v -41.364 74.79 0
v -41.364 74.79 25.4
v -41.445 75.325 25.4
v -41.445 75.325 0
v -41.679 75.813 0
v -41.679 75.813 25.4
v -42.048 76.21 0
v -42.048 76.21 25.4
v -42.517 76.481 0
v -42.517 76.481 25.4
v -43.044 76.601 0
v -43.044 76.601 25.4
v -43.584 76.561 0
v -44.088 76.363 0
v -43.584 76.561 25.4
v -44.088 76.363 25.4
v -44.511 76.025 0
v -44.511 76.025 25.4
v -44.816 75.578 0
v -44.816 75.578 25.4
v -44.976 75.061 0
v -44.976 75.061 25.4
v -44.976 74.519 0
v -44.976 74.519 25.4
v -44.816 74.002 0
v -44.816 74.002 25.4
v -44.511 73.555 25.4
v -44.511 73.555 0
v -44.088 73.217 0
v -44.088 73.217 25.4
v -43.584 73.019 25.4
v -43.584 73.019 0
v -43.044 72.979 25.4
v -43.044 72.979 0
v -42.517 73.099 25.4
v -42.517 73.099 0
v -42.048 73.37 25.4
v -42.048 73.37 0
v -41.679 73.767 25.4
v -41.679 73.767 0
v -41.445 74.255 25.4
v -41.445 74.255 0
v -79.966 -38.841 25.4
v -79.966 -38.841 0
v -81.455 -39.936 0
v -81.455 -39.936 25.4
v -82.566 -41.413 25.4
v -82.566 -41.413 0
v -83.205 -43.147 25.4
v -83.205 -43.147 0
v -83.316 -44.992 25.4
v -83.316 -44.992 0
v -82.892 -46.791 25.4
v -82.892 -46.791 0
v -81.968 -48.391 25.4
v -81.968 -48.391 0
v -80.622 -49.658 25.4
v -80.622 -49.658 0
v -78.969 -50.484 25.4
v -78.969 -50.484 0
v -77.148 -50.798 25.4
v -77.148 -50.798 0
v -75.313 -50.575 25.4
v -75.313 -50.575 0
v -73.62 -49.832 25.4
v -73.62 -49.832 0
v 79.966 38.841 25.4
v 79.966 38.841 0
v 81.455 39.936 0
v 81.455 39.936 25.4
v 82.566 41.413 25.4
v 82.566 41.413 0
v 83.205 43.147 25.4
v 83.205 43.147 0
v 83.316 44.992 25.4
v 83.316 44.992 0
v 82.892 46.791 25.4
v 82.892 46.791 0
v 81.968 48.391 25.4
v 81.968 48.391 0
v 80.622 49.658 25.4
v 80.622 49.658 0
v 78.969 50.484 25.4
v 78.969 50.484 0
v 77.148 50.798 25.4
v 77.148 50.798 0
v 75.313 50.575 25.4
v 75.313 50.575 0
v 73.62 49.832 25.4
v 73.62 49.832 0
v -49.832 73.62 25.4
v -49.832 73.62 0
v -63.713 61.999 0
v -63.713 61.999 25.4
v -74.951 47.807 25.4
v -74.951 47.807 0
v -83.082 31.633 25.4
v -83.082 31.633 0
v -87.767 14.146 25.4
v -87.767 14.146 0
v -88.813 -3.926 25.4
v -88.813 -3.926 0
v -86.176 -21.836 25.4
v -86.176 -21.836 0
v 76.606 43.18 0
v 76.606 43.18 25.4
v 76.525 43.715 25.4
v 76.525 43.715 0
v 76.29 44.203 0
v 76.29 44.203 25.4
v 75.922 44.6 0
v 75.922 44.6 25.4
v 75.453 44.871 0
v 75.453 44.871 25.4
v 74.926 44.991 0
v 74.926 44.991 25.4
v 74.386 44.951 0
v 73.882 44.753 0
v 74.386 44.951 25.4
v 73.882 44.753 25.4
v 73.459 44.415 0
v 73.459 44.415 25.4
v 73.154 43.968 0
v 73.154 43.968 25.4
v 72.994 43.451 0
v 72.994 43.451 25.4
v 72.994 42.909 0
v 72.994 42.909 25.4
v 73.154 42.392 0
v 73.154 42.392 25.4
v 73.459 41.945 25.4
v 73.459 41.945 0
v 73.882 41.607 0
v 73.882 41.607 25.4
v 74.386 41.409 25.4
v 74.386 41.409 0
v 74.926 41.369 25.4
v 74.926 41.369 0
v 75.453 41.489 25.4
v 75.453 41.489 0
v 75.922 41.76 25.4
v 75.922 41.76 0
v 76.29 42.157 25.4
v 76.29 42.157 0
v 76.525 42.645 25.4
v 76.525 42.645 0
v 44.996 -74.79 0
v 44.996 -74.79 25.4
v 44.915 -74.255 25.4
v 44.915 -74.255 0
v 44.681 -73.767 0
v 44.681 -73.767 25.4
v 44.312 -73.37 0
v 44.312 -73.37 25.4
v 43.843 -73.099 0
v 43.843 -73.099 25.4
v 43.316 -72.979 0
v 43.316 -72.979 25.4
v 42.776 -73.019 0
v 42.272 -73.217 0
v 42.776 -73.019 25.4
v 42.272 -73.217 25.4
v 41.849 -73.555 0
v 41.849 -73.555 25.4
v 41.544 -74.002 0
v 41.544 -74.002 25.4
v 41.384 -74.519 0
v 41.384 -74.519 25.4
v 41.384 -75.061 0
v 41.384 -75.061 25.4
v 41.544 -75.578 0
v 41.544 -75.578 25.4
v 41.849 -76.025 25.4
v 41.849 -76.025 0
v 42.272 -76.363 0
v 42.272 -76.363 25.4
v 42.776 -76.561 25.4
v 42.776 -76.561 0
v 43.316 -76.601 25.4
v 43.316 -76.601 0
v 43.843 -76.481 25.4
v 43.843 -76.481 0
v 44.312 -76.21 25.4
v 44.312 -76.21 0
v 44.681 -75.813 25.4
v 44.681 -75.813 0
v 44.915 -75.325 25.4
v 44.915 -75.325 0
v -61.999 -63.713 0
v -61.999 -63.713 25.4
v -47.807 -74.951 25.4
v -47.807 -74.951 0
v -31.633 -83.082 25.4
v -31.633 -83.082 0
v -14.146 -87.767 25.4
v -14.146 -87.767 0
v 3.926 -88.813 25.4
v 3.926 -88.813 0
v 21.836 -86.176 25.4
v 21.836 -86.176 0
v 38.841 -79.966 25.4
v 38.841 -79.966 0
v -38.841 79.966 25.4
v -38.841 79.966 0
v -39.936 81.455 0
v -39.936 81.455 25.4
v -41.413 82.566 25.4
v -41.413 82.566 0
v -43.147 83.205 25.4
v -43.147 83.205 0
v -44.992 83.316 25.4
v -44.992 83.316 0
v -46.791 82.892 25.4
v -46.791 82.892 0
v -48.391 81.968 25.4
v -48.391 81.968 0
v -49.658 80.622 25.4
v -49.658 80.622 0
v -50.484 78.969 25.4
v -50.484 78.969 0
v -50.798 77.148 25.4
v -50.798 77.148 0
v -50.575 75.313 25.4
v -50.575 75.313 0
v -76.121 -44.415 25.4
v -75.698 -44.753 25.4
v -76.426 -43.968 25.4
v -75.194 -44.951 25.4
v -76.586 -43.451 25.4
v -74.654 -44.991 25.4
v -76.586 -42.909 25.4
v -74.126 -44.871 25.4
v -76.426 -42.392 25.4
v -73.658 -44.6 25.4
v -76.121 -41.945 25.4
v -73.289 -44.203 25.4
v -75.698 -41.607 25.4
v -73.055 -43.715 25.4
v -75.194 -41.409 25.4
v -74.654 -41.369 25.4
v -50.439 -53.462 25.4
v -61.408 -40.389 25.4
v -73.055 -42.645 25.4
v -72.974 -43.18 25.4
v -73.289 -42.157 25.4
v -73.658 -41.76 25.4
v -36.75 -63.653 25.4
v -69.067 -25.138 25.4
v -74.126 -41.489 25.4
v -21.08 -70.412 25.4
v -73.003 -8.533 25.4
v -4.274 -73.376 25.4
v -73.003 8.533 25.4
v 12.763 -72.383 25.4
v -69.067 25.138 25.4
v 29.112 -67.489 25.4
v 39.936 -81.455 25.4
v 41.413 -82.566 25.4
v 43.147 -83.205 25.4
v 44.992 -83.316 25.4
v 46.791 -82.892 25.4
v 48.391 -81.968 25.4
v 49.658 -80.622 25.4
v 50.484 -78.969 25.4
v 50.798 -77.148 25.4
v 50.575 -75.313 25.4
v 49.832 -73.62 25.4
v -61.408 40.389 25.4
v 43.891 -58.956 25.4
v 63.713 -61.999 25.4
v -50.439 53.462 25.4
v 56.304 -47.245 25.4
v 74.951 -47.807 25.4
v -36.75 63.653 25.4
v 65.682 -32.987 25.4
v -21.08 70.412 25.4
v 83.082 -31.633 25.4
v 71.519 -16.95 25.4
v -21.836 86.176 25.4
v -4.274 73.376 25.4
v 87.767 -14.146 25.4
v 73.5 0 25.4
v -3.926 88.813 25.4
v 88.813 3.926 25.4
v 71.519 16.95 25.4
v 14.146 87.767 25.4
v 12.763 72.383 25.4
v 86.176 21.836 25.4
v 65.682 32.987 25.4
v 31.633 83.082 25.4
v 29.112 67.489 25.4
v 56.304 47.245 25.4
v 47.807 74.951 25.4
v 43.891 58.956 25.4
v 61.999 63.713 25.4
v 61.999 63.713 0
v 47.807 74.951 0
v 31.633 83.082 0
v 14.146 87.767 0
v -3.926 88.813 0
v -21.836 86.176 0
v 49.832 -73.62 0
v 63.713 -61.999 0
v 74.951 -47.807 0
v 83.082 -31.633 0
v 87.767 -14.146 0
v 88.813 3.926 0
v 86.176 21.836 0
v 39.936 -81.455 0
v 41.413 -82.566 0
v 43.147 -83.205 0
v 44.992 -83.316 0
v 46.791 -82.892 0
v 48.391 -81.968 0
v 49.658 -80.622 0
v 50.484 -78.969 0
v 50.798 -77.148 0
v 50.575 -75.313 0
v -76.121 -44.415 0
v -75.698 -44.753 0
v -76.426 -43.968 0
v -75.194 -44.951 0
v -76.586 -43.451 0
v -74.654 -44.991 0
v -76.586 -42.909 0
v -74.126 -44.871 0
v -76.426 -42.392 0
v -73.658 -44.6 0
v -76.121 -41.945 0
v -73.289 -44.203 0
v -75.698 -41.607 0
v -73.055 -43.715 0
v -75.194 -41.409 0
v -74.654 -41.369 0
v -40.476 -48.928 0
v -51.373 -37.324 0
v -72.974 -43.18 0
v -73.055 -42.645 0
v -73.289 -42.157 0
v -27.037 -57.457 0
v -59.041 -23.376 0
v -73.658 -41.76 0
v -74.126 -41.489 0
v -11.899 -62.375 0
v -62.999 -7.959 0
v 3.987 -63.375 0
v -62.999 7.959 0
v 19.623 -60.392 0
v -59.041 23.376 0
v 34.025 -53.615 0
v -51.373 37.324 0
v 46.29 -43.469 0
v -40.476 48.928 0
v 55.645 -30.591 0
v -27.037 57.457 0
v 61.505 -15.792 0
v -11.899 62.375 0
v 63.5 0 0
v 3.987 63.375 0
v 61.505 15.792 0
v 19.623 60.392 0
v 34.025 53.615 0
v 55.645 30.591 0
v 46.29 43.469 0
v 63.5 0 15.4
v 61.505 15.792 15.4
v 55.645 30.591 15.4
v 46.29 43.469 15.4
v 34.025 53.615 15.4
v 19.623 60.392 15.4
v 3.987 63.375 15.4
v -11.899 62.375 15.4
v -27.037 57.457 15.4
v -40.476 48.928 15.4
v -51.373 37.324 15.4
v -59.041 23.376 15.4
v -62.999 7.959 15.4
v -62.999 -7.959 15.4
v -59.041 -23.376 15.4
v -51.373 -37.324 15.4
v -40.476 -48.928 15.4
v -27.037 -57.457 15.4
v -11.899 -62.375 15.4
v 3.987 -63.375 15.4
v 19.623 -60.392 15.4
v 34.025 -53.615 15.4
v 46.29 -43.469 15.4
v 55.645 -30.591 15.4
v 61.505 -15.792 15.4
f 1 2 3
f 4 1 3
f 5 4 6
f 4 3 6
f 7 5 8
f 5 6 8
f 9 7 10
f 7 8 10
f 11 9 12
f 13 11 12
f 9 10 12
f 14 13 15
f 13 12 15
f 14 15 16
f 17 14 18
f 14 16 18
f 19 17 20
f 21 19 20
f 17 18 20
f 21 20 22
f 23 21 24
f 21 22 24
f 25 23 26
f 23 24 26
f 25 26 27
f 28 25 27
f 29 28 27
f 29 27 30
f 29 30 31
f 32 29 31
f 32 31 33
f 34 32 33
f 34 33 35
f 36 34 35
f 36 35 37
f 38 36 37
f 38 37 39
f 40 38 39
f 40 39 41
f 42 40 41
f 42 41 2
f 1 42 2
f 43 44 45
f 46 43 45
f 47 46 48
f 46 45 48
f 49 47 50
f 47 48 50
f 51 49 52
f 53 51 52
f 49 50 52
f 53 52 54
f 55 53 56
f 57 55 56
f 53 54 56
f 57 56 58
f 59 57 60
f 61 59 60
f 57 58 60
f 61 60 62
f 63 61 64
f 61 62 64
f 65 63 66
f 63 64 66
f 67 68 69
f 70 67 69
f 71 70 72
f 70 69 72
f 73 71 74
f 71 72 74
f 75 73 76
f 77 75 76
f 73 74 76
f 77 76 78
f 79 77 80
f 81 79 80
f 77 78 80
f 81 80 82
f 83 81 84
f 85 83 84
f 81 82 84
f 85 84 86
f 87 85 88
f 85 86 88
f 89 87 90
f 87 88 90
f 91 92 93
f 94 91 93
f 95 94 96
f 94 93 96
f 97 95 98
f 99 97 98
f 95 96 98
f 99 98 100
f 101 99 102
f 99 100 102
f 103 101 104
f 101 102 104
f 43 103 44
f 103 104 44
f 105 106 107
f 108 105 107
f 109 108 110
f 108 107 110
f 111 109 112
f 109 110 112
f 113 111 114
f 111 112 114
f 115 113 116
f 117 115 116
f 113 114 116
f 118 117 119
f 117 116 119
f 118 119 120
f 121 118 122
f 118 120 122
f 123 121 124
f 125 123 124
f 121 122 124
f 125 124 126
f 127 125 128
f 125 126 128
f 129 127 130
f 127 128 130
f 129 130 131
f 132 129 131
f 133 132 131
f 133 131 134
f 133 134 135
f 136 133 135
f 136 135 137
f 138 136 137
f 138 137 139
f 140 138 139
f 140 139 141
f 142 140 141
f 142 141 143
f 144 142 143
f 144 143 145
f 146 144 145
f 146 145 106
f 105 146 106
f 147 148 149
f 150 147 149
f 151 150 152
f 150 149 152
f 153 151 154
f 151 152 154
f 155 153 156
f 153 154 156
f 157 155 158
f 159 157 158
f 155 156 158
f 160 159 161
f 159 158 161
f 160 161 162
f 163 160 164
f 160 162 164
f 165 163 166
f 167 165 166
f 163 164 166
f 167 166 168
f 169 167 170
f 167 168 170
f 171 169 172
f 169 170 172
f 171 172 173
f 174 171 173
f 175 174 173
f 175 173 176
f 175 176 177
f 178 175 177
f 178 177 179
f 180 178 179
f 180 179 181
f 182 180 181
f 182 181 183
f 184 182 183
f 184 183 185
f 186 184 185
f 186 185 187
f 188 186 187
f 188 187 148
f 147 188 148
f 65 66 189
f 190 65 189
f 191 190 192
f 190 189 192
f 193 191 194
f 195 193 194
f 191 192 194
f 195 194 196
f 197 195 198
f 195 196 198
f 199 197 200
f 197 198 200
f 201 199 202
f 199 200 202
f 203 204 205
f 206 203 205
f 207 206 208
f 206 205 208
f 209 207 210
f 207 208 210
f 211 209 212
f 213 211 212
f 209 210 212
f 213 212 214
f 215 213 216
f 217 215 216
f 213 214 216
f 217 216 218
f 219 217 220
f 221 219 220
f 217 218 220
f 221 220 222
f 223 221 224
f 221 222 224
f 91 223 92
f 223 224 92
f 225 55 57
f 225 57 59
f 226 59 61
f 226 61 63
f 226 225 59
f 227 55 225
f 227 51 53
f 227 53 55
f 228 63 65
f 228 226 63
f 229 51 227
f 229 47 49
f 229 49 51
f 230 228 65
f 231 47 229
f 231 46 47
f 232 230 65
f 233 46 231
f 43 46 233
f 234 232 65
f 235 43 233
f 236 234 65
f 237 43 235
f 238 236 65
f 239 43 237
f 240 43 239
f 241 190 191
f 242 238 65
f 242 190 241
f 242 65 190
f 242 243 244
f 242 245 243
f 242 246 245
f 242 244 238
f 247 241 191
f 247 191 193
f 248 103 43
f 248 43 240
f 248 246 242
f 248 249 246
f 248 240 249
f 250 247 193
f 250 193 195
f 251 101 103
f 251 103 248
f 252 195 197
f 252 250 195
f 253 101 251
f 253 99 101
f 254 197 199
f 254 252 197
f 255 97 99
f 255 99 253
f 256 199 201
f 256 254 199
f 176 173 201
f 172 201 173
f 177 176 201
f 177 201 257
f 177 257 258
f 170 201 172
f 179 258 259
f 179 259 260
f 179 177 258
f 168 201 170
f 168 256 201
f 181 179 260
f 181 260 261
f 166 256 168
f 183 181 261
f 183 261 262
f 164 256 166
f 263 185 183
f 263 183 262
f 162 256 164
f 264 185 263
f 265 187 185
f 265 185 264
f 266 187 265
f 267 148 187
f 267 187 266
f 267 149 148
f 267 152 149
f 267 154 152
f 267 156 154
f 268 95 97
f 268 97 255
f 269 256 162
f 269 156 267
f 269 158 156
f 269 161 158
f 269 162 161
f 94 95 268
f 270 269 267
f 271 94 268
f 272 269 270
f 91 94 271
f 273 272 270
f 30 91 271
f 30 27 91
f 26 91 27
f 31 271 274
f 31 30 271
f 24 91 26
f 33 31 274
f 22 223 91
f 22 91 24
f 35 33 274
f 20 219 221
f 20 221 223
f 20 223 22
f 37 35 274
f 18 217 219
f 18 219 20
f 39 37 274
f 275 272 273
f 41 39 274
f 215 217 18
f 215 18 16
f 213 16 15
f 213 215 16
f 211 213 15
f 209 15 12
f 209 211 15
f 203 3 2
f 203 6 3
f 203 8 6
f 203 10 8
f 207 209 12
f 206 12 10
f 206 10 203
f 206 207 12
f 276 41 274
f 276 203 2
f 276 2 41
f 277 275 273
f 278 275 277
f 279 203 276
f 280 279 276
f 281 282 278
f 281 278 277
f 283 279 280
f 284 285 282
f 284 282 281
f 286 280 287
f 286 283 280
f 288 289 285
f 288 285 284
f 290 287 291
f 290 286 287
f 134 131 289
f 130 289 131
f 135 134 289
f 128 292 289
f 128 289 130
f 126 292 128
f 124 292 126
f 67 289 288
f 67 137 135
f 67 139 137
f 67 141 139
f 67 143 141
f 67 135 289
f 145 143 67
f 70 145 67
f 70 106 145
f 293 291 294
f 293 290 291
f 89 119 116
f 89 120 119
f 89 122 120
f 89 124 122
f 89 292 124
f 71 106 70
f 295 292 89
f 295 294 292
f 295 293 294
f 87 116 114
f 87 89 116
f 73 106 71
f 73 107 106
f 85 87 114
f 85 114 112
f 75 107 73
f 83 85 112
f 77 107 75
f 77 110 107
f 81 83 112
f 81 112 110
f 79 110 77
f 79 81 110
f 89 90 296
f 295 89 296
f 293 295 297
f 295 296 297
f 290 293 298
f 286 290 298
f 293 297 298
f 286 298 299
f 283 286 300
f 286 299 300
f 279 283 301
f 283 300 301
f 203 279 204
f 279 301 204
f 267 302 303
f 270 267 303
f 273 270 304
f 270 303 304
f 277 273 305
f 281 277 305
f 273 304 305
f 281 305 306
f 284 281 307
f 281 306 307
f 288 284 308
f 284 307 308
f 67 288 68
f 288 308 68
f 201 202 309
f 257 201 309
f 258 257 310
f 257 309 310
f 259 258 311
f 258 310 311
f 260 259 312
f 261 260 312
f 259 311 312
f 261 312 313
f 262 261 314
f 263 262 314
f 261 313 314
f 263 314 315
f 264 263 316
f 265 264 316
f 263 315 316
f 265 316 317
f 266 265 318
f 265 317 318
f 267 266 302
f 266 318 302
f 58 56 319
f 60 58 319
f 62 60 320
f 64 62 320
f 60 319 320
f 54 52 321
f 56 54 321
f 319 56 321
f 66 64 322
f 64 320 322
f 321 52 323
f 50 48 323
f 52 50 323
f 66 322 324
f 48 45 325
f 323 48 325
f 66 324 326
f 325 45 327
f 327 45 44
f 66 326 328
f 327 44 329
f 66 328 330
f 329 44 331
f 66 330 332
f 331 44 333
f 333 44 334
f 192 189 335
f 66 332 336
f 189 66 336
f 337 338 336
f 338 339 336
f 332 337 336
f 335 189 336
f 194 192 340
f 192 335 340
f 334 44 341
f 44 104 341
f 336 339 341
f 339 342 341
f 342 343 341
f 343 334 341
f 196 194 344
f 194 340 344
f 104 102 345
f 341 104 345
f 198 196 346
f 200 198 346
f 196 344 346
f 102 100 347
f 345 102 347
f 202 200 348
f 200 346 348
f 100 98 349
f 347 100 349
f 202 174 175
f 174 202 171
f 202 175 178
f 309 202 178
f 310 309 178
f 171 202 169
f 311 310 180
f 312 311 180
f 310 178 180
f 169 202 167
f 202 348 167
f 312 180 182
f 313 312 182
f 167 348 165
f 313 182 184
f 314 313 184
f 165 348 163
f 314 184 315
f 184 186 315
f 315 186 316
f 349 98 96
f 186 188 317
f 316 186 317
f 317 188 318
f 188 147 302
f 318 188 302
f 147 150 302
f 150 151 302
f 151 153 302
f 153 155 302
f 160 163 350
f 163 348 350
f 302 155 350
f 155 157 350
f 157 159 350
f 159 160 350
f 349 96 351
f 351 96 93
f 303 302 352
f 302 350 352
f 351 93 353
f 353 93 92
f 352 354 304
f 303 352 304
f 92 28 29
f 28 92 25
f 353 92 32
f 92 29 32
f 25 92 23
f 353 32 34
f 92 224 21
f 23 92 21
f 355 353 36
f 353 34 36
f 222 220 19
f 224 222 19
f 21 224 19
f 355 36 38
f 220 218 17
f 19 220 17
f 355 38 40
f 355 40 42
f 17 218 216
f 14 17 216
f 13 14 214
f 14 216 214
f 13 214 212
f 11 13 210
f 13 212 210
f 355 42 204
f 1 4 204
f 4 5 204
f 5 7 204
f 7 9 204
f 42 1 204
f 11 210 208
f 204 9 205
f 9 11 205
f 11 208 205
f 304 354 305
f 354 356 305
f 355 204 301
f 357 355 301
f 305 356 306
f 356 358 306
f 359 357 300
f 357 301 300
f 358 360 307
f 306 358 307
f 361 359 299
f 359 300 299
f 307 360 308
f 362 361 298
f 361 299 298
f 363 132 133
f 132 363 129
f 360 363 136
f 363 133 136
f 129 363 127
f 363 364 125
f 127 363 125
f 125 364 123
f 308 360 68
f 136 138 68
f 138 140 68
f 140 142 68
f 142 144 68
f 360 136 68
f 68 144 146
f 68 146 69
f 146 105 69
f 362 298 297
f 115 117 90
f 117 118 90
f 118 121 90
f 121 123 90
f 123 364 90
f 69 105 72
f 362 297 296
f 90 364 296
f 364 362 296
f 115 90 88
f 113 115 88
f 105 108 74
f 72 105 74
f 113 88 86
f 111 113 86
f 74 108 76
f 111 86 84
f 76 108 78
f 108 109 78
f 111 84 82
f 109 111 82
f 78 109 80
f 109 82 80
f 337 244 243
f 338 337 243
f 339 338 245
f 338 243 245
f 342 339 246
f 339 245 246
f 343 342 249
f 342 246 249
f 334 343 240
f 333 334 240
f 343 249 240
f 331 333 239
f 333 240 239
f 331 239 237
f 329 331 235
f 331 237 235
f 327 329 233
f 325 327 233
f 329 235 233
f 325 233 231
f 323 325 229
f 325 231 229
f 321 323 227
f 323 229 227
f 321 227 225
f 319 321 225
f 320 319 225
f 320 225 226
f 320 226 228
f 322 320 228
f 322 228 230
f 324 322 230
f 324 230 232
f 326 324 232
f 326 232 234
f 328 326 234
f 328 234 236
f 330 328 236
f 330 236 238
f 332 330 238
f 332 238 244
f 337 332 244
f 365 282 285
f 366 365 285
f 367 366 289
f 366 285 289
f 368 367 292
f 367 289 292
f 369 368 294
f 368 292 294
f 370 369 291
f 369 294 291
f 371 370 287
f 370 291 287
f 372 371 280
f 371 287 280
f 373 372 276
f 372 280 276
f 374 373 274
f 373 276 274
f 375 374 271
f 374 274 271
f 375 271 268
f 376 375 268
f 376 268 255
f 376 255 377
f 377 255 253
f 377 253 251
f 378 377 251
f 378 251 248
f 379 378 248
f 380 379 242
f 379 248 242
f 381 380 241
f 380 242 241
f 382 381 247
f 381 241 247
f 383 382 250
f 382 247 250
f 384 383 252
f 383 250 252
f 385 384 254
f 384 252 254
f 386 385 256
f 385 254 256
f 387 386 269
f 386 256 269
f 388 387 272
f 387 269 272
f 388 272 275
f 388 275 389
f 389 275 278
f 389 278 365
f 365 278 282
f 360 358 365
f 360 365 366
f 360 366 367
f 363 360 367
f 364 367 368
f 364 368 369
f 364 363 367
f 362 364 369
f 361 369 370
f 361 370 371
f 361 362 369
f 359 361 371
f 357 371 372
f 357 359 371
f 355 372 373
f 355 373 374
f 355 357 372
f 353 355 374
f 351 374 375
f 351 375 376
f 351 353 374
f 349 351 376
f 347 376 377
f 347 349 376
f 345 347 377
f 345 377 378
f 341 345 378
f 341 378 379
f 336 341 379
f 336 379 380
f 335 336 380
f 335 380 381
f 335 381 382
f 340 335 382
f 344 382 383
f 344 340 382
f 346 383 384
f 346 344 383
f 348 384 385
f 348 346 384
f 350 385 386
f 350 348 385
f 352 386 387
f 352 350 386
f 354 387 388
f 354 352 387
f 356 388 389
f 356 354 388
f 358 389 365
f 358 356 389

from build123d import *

# Parameters (mm, degrees)
SKETCH1_R           = 63.5
BOSS_EXTRUDE1_DEPTH = 25.4
CHAMFER1_SIZE       = 10
SKETCH3_R           = 1.8161
CUT_EXTRUDE1_DEPTH  = 26.4


with BuildPart() as part:
    # Sketch1 → Boss-Extrude1 (new body)
    with BuildSketch(Plane.XY):
        with BuildLine():
            ThreePointArc((49.832360156, -73.620281725), (85.870805957, -23.00901311), (79.966230688, 38.84085413))
            ThreePointArc((79.966230688, 38.84085413), (82.48891971, 47.625), (73.620281725, 49.832360156))
            ThreePointArc((73.620281725, 49.832360156), (23.00901311, 85.870805957), (-38.84085413, 79.966230688))
            ThreePointArc((-38.84085413, 79.966230688), (-47.625, 82.48891971), (-49.832360156, 73.620281725))
            ThreePointArc((-49.832360156, 73.620281725), (-85.870805957, 23.00901311), (-79.966230688, -38.84085413))
            ThreePointArc((-79.966230688, -38.84085413), (-82.48891971, -47.625), (-73.620281725, -49.832360156))
            ThreePointArc((-73.620281725, -49.832360156), (-23.00901311, -85.870805957), (38.84085413, -79.966230688))
            ThreePointArc((38.84085413, -79.966230688), (47.625, -82.48891971), (49.832360156, -73.620281725))
        make_face()
        Circle(SKETCH1_R, mode=Mode.SUBTRACT)
    extrude(amount=BOSS_EXTRUDE1_DEPTH)

    # Chamfer1
    chamfer1_edges = [part.edges().sort_by_distance(p)[0] for p in [
        (-63.5, 0, 25.4),
    ]]
    chamfer(chamfer1_edges, length=CHAMFER1_SIZE)

    # Sketch3 → Cut-Extrude1 (cut, through all)
    with BuildSketch(Plane.XY.offset(25.4)):
        with Locations((74.789953871, 43.18)):
            Circle(SKETCH3_R)
        with Locations((43.18, -74.789953871)):
            Circle(SKETCH3_R)
        with Locations((-74.789953871, -43.18)):
            Circle(SKETCH3_R)
        with Locations((-43.18, 74.789953871)):
            Circle(SKETCH3_R)
    extrude(amount=-CUT_EXTRUDE1_DEPTH, mode=Mode.SUBTRACT)


solid = part.part
